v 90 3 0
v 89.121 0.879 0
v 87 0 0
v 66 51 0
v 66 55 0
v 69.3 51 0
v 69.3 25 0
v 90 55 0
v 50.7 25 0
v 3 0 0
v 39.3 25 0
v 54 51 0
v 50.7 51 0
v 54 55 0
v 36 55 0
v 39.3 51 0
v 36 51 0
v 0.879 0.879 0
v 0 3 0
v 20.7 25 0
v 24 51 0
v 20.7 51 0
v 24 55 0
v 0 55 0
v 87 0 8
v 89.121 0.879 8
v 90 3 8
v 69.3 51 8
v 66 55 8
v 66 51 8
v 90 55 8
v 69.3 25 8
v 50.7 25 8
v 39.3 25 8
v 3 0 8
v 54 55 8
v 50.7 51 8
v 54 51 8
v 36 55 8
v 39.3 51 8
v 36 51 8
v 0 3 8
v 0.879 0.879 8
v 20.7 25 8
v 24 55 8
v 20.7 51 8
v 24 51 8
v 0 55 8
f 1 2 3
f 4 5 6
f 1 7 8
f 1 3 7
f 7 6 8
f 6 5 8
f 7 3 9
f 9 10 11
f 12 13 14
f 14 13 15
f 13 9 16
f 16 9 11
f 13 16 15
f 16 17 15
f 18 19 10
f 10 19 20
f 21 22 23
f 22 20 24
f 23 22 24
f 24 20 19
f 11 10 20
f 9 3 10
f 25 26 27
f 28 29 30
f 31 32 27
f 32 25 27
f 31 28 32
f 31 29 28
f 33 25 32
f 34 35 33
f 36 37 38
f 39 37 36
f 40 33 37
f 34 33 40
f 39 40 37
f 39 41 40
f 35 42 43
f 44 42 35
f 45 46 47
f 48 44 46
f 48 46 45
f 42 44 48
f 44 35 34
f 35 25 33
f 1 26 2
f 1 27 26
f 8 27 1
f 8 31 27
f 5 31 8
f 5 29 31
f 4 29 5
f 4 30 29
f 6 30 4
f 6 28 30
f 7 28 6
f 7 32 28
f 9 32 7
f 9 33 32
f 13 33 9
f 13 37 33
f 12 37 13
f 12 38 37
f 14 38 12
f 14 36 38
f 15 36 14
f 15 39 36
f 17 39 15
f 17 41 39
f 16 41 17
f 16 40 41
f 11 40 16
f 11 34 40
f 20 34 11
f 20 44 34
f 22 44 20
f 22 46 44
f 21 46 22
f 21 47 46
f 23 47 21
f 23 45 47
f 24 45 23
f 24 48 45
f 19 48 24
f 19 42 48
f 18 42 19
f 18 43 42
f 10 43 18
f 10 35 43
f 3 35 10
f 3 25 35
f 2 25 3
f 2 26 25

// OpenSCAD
$fn = 32;

// ----------------------------------------------------------------------
// Window plate: 90 x 55 mm, 2 open windows
// ----------------------------------------------------------------------

// --- parameters (mm) ---
profile_height = 8;       // extrusion height
profile_points = 24;      // points of the closed outline

profile = [[0, 3], [0.879, 0.879], [3, 0], [87, 0], [89.121, 0.879], [90, 3], [90, 55], [66, 55], [66, 51], [69.3, 51], [69.3, 25], [50.7, 25], [50.7, 51], [54, 51], [54, 55], [36, 55], [36, 51], [39.3, 51], [39.3, 25], [20.7, 25], [20.7, 51], [24, 51], [24, 55], [0, 55]];  // single closed polygon, 24 points, counter clockwise

// --- the one profile operation ---
linear_extrude(height = profile_height) polygon(points = profile);
